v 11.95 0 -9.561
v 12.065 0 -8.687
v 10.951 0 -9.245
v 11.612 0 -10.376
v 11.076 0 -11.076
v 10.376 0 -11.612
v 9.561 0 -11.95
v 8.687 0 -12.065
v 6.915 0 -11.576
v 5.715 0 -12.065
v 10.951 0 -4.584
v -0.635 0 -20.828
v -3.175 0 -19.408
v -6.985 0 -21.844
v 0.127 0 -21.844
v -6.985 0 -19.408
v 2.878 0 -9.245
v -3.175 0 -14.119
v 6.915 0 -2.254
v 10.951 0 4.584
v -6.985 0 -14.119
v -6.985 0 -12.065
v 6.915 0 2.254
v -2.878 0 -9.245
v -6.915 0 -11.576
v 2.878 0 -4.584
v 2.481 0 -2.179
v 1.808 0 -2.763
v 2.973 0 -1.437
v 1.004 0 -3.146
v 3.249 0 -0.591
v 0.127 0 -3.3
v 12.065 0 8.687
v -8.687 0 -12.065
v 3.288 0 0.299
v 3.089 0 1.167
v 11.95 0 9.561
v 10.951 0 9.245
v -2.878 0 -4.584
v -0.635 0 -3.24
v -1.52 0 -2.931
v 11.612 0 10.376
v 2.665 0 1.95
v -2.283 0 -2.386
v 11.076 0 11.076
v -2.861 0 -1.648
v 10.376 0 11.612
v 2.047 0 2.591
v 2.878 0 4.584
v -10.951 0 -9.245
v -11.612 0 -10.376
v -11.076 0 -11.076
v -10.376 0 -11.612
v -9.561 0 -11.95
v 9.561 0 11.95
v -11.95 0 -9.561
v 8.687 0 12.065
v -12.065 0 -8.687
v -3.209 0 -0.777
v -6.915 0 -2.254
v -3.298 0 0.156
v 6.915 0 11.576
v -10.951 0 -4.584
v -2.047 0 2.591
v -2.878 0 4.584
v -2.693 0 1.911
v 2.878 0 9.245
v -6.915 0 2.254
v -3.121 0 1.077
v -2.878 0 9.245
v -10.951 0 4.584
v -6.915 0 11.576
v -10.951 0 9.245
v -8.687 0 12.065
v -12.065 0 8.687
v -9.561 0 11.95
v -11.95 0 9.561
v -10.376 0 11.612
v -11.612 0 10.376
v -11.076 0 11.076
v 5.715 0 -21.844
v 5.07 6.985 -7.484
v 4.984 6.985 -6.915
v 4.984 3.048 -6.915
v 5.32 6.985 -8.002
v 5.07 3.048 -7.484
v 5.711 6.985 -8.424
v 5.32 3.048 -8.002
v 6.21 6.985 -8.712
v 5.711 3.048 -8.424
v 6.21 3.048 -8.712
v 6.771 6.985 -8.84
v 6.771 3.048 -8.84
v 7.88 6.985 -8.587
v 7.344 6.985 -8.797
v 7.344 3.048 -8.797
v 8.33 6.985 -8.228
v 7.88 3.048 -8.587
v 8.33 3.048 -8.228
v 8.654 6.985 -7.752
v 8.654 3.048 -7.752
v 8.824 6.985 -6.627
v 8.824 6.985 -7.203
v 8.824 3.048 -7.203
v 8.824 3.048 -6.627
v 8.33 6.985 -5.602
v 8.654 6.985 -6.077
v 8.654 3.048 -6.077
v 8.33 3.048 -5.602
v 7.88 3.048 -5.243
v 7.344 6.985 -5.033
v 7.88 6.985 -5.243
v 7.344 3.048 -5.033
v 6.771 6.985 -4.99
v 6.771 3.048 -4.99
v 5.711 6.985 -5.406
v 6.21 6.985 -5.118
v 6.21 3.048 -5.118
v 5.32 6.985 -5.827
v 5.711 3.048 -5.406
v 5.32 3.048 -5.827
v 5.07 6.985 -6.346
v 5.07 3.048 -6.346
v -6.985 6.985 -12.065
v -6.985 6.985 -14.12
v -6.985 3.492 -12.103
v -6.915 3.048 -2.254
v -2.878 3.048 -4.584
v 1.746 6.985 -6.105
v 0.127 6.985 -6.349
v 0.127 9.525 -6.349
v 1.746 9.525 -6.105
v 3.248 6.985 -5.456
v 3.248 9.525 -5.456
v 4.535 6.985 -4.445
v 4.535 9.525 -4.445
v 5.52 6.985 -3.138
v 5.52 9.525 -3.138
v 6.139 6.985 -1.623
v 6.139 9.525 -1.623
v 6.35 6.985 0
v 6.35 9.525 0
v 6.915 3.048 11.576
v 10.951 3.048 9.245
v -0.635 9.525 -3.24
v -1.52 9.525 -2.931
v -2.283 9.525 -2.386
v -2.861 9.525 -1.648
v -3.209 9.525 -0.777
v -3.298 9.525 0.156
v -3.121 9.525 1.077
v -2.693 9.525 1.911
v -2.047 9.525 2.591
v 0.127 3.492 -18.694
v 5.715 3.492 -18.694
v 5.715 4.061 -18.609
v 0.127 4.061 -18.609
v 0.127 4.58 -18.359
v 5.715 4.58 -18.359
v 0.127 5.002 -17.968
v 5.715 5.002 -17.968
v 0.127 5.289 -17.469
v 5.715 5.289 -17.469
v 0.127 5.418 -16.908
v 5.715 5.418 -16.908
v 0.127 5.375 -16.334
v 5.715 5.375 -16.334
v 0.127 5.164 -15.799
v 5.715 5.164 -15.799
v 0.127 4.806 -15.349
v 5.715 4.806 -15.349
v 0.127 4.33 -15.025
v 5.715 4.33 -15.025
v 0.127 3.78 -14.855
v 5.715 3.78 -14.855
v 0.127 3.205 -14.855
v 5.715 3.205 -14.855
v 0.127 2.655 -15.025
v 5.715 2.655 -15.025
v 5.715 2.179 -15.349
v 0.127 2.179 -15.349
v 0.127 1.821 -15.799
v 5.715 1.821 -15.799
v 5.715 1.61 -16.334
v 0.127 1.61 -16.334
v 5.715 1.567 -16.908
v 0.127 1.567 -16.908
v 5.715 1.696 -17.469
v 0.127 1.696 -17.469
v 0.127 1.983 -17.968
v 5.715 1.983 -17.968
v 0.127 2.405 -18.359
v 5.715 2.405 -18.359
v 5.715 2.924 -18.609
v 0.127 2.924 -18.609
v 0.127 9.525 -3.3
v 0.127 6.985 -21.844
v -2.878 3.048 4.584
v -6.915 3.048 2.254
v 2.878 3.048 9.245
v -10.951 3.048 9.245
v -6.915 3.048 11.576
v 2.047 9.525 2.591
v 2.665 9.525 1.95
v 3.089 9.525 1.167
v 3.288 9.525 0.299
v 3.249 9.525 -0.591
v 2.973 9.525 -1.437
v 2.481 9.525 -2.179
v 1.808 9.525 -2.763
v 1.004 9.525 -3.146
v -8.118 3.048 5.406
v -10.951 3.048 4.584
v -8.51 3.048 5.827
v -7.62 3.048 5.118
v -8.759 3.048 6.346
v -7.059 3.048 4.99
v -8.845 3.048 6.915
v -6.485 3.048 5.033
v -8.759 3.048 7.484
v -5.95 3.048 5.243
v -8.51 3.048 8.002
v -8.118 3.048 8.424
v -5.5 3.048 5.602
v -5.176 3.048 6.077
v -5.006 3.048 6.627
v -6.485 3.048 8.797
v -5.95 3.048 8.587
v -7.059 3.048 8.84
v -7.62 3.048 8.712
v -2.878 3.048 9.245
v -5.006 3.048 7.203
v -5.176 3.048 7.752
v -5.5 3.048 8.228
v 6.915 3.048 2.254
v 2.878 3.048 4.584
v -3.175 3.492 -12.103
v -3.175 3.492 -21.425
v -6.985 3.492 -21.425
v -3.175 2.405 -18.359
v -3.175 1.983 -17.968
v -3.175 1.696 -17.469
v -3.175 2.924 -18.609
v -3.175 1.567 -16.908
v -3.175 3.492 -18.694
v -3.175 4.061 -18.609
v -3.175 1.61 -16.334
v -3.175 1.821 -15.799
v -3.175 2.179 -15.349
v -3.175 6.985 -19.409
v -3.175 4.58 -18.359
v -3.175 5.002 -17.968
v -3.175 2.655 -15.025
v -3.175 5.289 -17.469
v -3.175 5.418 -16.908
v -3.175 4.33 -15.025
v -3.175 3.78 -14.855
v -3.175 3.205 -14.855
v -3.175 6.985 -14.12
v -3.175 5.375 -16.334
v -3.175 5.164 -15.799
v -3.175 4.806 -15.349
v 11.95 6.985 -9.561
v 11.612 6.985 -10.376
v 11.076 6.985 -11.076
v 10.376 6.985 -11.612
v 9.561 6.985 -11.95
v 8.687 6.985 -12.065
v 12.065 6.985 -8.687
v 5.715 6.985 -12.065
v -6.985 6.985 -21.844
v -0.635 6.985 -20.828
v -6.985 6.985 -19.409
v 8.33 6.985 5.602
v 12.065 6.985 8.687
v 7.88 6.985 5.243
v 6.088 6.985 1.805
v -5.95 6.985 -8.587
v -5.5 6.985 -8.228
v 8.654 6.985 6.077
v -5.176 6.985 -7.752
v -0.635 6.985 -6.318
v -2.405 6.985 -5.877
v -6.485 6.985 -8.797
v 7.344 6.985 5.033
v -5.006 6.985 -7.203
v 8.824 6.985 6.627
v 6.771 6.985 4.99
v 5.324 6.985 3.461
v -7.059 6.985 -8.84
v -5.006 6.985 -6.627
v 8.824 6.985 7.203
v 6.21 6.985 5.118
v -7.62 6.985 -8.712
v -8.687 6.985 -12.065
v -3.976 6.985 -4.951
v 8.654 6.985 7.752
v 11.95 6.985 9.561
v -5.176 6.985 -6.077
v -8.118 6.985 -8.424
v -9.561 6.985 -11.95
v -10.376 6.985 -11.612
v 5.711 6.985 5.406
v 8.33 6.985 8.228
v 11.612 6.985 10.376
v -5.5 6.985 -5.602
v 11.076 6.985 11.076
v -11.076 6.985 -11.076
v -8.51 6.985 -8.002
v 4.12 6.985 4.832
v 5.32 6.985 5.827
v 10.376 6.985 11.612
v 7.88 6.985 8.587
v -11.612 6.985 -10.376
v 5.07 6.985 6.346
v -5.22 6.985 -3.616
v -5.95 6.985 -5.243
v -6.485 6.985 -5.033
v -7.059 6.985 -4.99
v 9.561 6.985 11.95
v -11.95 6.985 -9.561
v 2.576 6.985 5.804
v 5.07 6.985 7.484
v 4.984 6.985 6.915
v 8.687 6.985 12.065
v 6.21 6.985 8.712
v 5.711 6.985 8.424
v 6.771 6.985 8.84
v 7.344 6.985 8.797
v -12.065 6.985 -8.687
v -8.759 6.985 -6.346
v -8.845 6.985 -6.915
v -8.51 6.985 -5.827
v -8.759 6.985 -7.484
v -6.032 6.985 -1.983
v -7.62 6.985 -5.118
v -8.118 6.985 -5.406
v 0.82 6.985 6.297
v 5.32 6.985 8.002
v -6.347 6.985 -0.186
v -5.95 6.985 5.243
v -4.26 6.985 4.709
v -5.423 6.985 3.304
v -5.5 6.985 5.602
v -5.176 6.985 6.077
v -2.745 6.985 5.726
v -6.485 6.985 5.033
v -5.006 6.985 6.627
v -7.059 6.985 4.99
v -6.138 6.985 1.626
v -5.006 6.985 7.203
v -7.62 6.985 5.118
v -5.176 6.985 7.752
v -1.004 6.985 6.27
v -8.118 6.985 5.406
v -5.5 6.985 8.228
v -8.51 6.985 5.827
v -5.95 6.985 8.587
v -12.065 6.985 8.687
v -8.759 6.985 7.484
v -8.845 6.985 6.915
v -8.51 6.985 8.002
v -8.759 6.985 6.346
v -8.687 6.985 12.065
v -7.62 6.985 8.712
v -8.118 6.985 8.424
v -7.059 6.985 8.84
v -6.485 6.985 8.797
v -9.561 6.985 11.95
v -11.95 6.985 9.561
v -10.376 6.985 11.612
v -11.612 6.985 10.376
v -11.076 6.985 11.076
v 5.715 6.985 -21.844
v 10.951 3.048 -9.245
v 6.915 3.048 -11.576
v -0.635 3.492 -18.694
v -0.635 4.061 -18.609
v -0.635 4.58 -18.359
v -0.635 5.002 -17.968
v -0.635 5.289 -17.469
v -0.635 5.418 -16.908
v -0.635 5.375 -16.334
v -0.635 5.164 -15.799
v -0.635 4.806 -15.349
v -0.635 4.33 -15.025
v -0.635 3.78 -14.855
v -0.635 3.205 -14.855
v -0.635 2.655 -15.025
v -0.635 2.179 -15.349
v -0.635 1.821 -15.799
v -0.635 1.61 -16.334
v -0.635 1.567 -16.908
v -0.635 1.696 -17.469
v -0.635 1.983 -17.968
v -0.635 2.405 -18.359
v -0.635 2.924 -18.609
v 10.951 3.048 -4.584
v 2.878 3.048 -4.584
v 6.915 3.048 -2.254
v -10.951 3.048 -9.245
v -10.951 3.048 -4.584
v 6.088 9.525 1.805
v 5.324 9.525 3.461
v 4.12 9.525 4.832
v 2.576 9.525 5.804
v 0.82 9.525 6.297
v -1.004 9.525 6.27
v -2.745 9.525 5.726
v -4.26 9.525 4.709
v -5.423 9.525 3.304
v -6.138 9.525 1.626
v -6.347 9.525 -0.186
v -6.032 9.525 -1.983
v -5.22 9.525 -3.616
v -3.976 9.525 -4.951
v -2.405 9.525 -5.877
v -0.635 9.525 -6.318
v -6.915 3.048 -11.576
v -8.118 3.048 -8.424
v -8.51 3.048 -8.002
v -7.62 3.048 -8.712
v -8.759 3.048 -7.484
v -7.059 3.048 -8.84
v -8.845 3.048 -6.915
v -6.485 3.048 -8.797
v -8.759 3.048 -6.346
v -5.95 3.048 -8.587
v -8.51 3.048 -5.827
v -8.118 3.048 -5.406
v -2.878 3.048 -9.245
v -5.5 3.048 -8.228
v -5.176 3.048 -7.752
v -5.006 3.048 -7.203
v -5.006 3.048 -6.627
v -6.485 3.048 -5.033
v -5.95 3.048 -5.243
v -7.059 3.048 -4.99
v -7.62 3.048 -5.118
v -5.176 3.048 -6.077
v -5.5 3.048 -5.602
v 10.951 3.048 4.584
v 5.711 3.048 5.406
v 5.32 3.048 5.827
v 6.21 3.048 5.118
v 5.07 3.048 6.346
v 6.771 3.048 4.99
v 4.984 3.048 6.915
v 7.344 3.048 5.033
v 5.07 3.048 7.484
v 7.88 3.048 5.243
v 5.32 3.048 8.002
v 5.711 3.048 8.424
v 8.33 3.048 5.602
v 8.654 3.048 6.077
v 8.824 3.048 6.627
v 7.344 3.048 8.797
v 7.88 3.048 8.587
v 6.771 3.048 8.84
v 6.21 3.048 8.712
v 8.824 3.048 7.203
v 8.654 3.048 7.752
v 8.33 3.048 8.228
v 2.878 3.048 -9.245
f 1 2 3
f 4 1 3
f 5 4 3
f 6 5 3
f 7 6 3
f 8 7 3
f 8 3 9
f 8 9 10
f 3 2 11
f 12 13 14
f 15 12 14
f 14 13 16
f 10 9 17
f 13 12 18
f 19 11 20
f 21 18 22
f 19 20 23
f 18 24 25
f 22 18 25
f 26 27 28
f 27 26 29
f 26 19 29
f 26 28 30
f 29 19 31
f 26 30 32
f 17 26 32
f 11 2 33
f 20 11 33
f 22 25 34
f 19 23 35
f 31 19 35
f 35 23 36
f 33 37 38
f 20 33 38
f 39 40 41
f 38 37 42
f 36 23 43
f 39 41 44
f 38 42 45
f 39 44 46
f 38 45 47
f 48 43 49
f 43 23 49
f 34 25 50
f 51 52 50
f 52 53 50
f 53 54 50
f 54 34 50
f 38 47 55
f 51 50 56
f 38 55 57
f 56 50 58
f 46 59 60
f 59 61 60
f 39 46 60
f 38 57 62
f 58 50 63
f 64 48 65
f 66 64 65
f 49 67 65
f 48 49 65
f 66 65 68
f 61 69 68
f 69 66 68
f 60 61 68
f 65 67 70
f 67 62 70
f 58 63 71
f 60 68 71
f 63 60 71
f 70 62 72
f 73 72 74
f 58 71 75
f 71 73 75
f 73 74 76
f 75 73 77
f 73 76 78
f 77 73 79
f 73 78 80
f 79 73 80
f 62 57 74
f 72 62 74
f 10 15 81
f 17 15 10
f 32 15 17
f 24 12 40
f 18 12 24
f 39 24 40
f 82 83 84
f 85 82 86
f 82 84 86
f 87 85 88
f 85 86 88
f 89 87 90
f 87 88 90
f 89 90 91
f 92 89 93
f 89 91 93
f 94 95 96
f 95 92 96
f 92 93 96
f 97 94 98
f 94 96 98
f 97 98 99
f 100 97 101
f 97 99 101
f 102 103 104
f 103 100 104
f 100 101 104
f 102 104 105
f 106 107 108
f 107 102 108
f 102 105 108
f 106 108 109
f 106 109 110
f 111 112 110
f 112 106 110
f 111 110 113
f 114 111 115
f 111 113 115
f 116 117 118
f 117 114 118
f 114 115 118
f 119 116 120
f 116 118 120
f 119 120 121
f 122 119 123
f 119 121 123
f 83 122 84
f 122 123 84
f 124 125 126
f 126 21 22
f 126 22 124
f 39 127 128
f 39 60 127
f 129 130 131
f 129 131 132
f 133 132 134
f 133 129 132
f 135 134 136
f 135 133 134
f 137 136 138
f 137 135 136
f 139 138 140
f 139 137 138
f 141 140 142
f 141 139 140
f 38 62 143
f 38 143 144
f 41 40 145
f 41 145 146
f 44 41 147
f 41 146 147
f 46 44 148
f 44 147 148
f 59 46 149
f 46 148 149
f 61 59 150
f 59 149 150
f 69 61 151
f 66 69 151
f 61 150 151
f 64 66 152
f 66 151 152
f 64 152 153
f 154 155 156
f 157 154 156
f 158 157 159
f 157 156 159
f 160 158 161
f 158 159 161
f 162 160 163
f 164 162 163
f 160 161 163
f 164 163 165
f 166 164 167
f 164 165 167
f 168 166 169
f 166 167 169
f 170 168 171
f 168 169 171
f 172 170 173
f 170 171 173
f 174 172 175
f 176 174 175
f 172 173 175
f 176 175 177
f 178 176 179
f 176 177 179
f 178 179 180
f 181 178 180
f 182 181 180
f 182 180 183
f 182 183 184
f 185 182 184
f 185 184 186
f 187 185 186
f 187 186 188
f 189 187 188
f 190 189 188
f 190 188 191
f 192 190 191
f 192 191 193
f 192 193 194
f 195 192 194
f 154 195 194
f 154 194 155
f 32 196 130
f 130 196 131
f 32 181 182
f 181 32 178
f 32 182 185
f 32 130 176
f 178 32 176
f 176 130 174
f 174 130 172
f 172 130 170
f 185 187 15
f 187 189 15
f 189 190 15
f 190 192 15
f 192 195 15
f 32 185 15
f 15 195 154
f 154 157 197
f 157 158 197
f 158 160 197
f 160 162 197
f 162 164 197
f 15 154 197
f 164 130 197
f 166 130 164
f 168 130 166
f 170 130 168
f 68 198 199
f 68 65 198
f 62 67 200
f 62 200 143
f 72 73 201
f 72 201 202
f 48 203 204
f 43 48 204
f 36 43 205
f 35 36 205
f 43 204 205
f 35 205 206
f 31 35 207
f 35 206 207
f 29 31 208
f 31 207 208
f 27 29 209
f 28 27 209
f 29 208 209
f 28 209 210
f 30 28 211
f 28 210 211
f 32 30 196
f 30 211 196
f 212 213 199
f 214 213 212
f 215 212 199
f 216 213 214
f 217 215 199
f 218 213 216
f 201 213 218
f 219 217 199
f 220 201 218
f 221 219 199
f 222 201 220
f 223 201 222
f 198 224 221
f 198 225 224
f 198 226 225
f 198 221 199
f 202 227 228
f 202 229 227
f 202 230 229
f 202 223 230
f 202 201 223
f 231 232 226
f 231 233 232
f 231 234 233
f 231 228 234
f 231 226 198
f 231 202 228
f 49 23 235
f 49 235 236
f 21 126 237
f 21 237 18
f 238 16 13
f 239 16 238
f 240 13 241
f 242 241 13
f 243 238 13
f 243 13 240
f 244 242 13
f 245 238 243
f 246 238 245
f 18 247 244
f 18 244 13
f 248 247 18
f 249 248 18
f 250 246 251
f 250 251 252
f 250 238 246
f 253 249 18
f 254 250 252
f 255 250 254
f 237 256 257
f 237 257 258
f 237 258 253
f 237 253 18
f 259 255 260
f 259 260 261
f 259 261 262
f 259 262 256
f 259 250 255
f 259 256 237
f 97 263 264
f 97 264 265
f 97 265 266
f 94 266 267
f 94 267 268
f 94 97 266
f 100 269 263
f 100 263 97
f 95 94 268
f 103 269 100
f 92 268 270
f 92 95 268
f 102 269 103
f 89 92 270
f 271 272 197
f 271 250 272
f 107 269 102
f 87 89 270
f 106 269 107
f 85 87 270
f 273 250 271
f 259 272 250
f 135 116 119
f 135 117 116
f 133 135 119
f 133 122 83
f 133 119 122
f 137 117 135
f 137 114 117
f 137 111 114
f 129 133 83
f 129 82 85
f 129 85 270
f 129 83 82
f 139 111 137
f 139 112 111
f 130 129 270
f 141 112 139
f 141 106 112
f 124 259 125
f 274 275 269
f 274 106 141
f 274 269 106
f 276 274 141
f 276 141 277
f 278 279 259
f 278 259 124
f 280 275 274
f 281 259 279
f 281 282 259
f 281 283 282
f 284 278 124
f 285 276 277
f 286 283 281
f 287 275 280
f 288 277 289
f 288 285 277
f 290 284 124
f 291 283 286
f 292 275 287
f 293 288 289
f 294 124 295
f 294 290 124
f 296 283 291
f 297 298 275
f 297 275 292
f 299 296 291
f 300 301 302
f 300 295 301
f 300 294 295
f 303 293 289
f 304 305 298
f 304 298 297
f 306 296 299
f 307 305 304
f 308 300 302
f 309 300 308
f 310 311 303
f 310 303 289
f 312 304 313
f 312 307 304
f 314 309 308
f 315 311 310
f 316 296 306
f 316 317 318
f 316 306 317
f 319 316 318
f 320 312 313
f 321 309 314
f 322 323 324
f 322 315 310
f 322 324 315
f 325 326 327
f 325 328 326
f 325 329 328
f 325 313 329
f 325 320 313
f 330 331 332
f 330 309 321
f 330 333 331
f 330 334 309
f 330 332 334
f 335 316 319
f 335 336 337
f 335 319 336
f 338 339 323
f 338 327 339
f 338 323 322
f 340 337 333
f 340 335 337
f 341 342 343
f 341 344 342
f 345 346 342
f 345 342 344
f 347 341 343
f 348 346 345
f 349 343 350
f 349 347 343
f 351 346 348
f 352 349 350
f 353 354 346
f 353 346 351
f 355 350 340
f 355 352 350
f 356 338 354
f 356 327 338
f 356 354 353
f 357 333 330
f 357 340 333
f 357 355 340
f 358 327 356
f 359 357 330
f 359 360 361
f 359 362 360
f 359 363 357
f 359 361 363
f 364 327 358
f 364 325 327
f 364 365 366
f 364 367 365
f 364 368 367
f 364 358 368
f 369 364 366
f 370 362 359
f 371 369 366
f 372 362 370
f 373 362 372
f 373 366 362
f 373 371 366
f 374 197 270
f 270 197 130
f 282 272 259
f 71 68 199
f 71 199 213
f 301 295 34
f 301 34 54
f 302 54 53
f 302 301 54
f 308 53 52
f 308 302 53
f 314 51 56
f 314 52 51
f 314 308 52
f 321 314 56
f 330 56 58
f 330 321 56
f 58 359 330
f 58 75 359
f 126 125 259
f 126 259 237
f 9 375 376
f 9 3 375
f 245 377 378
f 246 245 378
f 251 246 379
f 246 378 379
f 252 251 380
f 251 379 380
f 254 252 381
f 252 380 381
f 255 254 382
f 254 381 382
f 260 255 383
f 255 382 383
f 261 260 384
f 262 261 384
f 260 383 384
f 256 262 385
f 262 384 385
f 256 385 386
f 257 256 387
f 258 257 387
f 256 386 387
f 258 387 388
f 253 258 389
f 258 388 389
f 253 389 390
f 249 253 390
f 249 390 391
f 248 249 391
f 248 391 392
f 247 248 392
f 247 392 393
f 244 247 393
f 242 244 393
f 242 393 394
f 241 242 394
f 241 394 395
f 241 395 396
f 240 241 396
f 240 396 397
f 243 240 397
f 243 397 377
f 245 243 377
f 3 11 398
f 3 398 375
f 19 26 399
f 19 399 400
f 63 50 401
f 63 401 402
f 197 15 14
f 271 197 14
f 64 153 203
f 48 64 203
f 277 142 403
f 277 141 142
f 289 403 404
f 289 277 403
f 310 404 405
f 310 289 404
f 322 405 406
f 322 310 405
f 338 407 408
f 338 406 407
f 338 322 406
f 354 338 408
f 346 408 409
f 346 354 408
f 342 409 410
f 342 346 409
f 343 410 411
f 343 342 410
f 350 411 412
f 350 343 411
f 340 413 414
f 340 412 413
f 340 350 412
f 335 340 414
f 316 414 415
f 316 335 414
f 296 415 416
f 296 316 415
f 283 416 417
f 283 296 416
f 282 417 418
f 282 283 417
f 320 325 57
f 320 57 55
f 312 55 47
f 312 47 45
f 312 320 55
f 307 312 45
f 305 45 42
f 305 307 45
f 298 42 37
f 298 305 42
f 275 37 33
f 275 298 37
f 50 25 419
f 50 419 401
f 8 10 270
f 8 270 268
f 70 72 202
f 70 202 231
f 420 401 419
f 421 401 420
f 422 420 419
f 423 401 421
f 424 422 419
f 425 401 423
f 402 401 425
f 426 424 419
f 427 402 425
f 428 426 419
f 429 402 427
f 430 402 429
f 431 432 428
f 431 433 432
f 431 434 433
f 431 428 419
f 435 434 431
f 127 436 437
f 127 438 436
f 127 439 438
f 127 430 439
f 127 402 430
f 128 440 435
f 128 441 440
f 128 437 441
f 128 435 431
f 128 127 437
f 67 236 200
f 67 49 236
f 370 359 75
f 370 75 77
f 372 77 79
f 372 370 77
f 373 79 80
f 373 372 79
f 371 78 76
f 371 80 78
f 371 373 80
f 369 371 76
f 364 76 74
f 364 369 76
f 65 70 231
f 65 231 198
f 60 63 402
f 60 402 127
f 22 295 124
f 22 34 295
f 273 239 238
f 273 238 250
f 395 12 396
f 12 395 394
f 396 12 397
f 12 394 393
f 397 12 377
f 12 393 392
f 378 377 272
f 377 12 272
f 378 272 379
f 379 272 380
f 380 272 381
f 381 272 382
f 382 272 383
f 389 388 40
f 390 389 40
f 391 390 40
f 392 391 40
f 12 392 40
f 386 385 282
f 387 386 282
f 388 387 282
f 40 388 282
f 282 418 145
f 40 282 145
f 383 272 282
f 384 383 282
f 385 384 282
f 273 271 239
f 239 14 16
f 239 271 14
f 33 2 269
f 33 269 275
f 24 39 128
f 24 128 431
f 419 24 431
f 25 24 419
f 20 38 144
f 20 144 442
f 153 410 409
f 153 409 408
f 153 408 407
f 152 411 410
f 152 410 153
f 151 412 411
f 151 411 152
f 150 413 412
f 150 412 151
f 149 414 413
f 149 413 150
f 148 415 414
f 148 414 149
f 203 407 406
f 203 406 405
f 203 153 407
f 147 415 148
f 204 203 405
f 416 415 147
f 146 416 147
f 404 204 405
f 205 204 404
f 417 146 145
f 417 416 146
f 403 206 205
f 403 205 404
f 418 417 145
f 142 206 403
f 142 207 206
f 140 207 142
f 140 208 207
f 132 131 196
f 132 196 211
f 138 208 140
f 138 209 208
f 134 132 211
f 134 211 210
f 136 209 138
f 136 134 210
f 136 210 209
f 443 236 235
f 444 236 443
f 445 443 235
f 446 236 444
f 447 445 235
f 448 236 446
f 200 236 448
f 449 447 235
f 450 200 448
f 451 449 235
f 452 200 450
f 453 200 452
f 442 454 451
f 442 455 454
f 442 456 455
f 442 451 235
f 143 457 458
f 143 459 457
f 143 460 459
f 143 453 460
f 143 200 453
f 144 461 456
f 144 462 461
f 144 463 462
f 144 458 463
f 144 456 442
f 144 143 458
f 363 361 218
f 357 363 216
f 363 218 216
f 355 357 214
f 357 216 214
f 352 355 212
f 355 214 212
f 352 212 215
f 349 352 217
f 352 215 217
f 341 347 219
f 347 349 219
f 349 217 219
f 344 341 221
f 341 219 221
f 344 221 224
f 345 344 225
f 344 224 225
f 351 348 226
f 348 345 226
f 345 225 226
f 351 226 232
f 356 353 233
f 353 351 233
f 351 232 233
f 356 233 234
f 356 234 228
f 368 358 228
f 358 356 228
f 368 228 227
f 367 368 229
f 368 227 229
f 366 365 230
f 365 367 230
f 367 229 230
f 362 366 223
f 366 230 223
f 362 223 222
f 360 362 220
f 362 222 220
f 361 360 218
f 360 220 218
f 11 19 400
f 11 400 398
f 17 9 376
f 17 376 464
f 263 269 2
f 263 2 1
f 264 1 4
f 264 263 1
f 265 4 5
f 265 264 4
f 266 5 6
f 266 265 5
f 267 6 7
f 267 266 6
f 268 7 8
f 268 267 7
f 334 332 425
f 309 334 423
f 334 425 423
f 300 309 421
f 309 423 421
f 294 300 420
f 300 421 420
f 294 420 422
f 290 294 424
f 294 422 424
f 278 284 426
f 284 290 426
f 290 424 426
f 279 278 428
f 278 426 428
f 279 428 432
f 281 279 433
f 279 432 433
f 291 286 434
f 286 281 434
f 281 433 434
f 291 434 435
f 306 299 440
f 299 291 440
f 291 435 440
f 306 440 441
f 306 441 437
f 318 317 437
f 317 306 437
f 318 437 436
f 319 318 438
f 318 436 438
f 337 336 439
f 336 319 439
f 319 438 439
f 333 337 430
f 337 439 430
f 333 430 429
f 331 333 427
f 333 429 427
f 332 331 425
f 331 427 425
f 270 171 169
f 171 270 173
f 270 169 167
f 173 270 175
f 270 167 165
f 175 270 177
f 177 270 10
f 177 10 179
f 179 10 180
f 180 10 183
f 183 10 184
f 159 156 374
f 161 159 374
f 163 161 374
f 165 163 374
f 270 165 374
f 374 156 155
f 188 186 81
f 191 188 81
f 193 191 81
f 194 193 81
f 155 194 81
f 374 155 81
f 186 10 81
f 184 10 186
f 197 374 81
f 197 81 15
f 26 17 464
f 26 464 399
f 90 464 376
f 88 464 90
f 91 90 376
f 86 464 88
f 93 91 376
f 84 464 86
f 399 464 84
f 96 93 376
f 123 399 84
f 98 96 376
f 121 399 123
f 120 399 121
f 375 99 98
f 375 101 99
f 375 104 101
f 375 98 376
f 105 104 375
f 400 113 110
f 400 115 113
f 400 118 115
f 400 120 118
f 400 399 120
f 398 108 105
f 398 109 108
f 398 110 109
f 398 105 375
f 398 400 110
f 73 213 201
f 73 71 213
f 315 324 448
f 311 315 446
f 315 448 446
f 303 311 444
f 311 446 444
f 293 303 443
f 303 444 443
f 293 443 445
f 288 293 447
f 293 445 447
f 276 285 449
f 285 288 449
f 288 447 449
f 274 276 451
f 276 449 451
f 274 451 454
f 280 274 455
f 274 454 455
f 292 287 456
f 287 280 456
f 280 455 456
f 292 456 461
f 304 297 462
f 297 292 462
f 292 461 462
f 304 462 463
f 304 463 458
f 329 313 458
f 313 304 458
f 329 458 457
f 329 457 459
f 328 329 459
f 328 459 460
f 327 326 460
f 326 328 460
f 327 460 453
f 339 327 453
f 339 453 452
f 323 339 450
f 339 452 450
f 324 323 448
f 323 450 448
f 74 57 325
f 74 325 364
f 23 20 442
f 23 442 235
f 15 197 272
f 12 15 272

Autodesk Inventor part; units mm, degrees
ref_plane "YZ Plane" through (0, 0, 0) normal (1, 0, 0) x (0, 1, 0)
ref_plane "XZ Plane" through (0, 0, 0) normal (0, 1, 0) x (-1, 0, 0)
ref_plane "XY Plane" through (0, 0, 0) normal (0, 0, 1) x (1, 0, 0)
sketch "Sketch1" plane through (0, 0, 0) normal (0, 1, 0) x (-1, 0, 0)
  line L0 (-12.065, 12.065) -> (12.065, 12.065)
  line L1 (12.065, 12.065) -> (12.065, -12.065)
  line L2 (-12.065, -12.065) -> (-12.065, 12.065)
  circle A0 centre (6.9148, -6.9148) radius 1.9304
  circle A1 centre (6.9148, 6.9148) radius 1.9304
  circle A2 centre (-6.9148, 6.9148) radius 1.9304
  circle A3 centre (-6.9148, -6.9148) radius 1.9304
  line L3 (-5.715, -12.065) -> (-5.715, -21.844)
  line L4 (-5.715, -21.844) -> (6.985, -21.844)
  line L5 (6.985, -21.844) -> (6.985, -12.065)
  line L6 (12.065, -12.065) -> (6.985, -12.065)
  line L7 (-5.715, -12.065) -> (-12.065, -12.065)
  point P0 (0, 0)
  dimension "d0" = 24.13
  dimension "d2" = 12.065
  dimension "d3" = 12.065
  dimension "d4" = 3.8608
  dimension "d5" = 6.9148
  dimension "d6" = 6.9148
  dimension "d7" = 3.8608
  dimension "d8" = 6.9148
  dimension "d9" = 6.9148
  dimension "d10" = 3.8608
  dimension "d11" = 6.9148
  dimension "d12" = 6.9148
  dimension "d13" = 3.8608
  dimension "d14" = 12.7
  dimension "d16" = 6.985
  dimension "d41" = 6.9148
  dimension "d42" = 6.9148
  dimension "d43" = 24.13
  dimension "d44" = 24.13
  dimension "d50" = 9.779
  dimension "d51" = 9.779
extrude "Shape" add sketch "Sketch1" along normal blind 6.985
sketch "Sketch2" plane through (-6.985, 0, -21.844) normal (-1, 0, 0) x (0, 0, 1)
  circle A0 centre (5.08, 3.4925) radius 4.6609 construction
  line L0 (9.779, 0) -> (0, 0) projected
  line L1 (0, 0) -> (0, 6.985) projected
  line L2 (9.7409, 3.4925) -> (7.4105, -0.544)
  line L3 (7.4105, -0.544) -> (2.7496, -0.544)
  line L4 (2.7496, -0.544) -> (0.4191, 3.4925)
  line L5 (0.4191, 3.4925) -> (2.7495, 7.529)
  line L6 (2.7495, 7.529) -> (7.4104, 7.529)
  line L7 (7.4104, 7.529) -> (9.7409, 3.4925)
  line L8 (9.779, 0) -> (9.779, 6.985) projected
  point P0 (21.844, 0)
  dimension "d19" = 9.3218
  dimension "d20" = 3.4925
  dimension "d52" = 4.699
extrude "NutWellSide" cut sketch "Sketch2" against normal blind 3.81
sketch "Sketch3" plane through (5.715, 0, -12.065) normal (1, 0, 0) x (0, 0, -1)
  circle A0 centre (4.699, 3.4925) radius 1.9304
  line L0 (9.779, 0) -> (9.779, 6.985) projected
  line L1 (0, 6.985) -> (9.779, 6.985) projected
  line L2 (0, 0) -> (0, 6.985) projected
  point P0 (-12.065, 0)
  dimension "d24" = 3.8608
  dimension "d26" = 3.4925
  dimension "d53" = 4.699
extrude "HoleClamping" cut sketch "Sketch3" against normal through all
sketch "Sketch4" plane through (0, 6.985, 0) normal (0, 1, 0) x (1, 0, 0)
  circle A0 centre (0, 0) radius 6.35
  dimension "d29" = 12.7
extrude "Boss" add sketch "Sketch4" along normal blind 2.54
sketch "Sketch5" plane through (0, 9.525, 0) normal (0, 1, 0) x (1, 0, 0)
  arc A0 (2.0472, -2.5908) -> (-2.0472, -2.5908) centre (0, 0) ccw
  line L0 (-2.0472, -2.5908) -> (2.0472, -2.5908)
  dimension "d32" = 6.604
  dimension "d33" = 2.5908
fillet "Fillet1" radius 3.3782 4 edges at (12.065, 3.4925, 12.065) (12.065, 3.4925, -12.065) (-12.065, 3.4925, 12.065) (-12.065, 3.4925, -12.065)
extrude "HoleD" cut sketch "Sketch5" against normal through all
sketch "Sketch6" plane through (0, 9.525, 0) normal (0, 1, 0) x (1, 0, 0)
  line L0 (-6.985, 21.844) -> (5.715, 21.844) projected
  line L1 (0.127, 0.254) -> (0.127, 21.844)
  line L2 (0.127, 21.844) -> (-0.635, 20.828)
  line L3 (-0.635, 20.828) -> (-0.635, 0.254)
  line L4 (-0.1123, -19.3229) -> (0.127, 21.844) construction
  line L5 (0.6195, -20.3205) -> (-0.635, 20.828) construction
  line L6 (-0.635, 0.254) -> (0.127, 0.254)
  point P0 (0, 0)
  dimension "d37" = 1.27
extrude "ClampingSlot" cut sketch "Sketch6" against normal through all
sketch "Sketch7" plane through (0, 0, 0) normal (0, -1, 0) x (1, 0, 0)
  circle A0 centre (-6.9148, 6.9148) radius 1.9304 construction
  circle A1 centre (-6.9148, 6.9148) radius 4.6609 construction
  line L0 (-6.9148, 2.2539) -> (-10.9513, 4.5843)
  line L1 (-10.9513, 4.5843) -> (-10.9513, 9.2452)
  line L2 (-10.9513, 9.2452) -> (-6.9148, 11.5757)
  line L3 (-6.9148, 11.5757) -> (-2.8783, 9.2452)
  line L4 (-2.8783, 9.2452) -> (-2.8783, 4.5843)
  line L5 (-2.8783, 4.5843) -> (-6.9148, 2.2539)
  circle A2 centre (-6.9148, -6.9148) radius 1.9304 construction
  circle A3 centre (-6.9148, -6.9148) radius 4.6609 construction
  circle A4 centre (6.9148, -6.9148) radius 1.9304 construction
  circle A5 centre (6.9148, -6.9148) radius 4.6609 construction
  circle A6 centre (6.9148, 6.9148) radius 1.9304 construction
  circle A7 centre (6.9148, 6.9148) radius 4.6609 construction
  line L6 (6.9148, 2.2539) -> (2.8783, 4.5843)
  line L7 (2.8783, 4.5843) -> (2.8783, 9.2452)
  line L8 (2.8783, 9.2452) -> (6.9148, 11.5757)
  line L9 (6.9148, 11.5757) -> (10.9513, 9.2452)
  line L10 (10.9513, 9.2452) -> (10.9513, 4.5843)
  line L11 (10.9513, 4.5843) -> (6.9148, 2.2539)
  line L12 (6.9148, -2.2539) -> (10.9513, -4.5843)
  line L13 (10.9513, -4.5843) -> (10.9513, -9.2452)
  line L14 (10.9513, -9.2452) -> (6.9148, -11.5757)
  line L15 (6.9148, -11.5757) -> (2.8783, -9.2452)
  line L16 (2.8783, -9.2452) -> (2.8783, -4.5843)
  line L17 (2.8783, -4.5843) -> (6.9148, -2.2539)
  line L18 (-6.9148, -2.2539) -> (-2.8783, -4.5843)
  line L19 (-2.8783, -4.5843) -> (-2.8783, -9.2452)
  line L20 (-2.8783, -9.2452) -> (-6.9148, -11.5757)
  line L21 (-6.9148, -11.5757) -> (-10.9513, -9.2452)
  line L22 (-10.9513, -9.2452) -> (-10.9513, -4.5843)
  line L23 (-10.9513, -4.5843) -> (-6.9148, -2.2539)
  point P0 (0, 0)
  dimension "d40" = 9.3218
  dimension "d45" = 9.3218
  dimension "d46" = 9.3218
  dimension "d47" = 9.3218
extrude "NutWellAttachment" cut sketch "Sketch7" against normal blind 3.048
equation "\"d2\" = 0.5 * d0"
equation "\"d3\" = 0.5 * d0"
equation "\"d6\" = d9"
equation "\"d7\" = d4"
equation "\"d8\" = d9"
equation "\"d9\" = d5"
equation "\"d10\" = d4"
equation "\"d11\" = d9"
equation "\"d12\" = d9"
equation "\"d13\" = d4"
equation "\"d41\" = d9"
equation "\"d42\" = d5"
equation "\"d43\" = d0"
equation "\"d44\" = d0"
properties part number "clamping hub 1_4 D nut wells"
